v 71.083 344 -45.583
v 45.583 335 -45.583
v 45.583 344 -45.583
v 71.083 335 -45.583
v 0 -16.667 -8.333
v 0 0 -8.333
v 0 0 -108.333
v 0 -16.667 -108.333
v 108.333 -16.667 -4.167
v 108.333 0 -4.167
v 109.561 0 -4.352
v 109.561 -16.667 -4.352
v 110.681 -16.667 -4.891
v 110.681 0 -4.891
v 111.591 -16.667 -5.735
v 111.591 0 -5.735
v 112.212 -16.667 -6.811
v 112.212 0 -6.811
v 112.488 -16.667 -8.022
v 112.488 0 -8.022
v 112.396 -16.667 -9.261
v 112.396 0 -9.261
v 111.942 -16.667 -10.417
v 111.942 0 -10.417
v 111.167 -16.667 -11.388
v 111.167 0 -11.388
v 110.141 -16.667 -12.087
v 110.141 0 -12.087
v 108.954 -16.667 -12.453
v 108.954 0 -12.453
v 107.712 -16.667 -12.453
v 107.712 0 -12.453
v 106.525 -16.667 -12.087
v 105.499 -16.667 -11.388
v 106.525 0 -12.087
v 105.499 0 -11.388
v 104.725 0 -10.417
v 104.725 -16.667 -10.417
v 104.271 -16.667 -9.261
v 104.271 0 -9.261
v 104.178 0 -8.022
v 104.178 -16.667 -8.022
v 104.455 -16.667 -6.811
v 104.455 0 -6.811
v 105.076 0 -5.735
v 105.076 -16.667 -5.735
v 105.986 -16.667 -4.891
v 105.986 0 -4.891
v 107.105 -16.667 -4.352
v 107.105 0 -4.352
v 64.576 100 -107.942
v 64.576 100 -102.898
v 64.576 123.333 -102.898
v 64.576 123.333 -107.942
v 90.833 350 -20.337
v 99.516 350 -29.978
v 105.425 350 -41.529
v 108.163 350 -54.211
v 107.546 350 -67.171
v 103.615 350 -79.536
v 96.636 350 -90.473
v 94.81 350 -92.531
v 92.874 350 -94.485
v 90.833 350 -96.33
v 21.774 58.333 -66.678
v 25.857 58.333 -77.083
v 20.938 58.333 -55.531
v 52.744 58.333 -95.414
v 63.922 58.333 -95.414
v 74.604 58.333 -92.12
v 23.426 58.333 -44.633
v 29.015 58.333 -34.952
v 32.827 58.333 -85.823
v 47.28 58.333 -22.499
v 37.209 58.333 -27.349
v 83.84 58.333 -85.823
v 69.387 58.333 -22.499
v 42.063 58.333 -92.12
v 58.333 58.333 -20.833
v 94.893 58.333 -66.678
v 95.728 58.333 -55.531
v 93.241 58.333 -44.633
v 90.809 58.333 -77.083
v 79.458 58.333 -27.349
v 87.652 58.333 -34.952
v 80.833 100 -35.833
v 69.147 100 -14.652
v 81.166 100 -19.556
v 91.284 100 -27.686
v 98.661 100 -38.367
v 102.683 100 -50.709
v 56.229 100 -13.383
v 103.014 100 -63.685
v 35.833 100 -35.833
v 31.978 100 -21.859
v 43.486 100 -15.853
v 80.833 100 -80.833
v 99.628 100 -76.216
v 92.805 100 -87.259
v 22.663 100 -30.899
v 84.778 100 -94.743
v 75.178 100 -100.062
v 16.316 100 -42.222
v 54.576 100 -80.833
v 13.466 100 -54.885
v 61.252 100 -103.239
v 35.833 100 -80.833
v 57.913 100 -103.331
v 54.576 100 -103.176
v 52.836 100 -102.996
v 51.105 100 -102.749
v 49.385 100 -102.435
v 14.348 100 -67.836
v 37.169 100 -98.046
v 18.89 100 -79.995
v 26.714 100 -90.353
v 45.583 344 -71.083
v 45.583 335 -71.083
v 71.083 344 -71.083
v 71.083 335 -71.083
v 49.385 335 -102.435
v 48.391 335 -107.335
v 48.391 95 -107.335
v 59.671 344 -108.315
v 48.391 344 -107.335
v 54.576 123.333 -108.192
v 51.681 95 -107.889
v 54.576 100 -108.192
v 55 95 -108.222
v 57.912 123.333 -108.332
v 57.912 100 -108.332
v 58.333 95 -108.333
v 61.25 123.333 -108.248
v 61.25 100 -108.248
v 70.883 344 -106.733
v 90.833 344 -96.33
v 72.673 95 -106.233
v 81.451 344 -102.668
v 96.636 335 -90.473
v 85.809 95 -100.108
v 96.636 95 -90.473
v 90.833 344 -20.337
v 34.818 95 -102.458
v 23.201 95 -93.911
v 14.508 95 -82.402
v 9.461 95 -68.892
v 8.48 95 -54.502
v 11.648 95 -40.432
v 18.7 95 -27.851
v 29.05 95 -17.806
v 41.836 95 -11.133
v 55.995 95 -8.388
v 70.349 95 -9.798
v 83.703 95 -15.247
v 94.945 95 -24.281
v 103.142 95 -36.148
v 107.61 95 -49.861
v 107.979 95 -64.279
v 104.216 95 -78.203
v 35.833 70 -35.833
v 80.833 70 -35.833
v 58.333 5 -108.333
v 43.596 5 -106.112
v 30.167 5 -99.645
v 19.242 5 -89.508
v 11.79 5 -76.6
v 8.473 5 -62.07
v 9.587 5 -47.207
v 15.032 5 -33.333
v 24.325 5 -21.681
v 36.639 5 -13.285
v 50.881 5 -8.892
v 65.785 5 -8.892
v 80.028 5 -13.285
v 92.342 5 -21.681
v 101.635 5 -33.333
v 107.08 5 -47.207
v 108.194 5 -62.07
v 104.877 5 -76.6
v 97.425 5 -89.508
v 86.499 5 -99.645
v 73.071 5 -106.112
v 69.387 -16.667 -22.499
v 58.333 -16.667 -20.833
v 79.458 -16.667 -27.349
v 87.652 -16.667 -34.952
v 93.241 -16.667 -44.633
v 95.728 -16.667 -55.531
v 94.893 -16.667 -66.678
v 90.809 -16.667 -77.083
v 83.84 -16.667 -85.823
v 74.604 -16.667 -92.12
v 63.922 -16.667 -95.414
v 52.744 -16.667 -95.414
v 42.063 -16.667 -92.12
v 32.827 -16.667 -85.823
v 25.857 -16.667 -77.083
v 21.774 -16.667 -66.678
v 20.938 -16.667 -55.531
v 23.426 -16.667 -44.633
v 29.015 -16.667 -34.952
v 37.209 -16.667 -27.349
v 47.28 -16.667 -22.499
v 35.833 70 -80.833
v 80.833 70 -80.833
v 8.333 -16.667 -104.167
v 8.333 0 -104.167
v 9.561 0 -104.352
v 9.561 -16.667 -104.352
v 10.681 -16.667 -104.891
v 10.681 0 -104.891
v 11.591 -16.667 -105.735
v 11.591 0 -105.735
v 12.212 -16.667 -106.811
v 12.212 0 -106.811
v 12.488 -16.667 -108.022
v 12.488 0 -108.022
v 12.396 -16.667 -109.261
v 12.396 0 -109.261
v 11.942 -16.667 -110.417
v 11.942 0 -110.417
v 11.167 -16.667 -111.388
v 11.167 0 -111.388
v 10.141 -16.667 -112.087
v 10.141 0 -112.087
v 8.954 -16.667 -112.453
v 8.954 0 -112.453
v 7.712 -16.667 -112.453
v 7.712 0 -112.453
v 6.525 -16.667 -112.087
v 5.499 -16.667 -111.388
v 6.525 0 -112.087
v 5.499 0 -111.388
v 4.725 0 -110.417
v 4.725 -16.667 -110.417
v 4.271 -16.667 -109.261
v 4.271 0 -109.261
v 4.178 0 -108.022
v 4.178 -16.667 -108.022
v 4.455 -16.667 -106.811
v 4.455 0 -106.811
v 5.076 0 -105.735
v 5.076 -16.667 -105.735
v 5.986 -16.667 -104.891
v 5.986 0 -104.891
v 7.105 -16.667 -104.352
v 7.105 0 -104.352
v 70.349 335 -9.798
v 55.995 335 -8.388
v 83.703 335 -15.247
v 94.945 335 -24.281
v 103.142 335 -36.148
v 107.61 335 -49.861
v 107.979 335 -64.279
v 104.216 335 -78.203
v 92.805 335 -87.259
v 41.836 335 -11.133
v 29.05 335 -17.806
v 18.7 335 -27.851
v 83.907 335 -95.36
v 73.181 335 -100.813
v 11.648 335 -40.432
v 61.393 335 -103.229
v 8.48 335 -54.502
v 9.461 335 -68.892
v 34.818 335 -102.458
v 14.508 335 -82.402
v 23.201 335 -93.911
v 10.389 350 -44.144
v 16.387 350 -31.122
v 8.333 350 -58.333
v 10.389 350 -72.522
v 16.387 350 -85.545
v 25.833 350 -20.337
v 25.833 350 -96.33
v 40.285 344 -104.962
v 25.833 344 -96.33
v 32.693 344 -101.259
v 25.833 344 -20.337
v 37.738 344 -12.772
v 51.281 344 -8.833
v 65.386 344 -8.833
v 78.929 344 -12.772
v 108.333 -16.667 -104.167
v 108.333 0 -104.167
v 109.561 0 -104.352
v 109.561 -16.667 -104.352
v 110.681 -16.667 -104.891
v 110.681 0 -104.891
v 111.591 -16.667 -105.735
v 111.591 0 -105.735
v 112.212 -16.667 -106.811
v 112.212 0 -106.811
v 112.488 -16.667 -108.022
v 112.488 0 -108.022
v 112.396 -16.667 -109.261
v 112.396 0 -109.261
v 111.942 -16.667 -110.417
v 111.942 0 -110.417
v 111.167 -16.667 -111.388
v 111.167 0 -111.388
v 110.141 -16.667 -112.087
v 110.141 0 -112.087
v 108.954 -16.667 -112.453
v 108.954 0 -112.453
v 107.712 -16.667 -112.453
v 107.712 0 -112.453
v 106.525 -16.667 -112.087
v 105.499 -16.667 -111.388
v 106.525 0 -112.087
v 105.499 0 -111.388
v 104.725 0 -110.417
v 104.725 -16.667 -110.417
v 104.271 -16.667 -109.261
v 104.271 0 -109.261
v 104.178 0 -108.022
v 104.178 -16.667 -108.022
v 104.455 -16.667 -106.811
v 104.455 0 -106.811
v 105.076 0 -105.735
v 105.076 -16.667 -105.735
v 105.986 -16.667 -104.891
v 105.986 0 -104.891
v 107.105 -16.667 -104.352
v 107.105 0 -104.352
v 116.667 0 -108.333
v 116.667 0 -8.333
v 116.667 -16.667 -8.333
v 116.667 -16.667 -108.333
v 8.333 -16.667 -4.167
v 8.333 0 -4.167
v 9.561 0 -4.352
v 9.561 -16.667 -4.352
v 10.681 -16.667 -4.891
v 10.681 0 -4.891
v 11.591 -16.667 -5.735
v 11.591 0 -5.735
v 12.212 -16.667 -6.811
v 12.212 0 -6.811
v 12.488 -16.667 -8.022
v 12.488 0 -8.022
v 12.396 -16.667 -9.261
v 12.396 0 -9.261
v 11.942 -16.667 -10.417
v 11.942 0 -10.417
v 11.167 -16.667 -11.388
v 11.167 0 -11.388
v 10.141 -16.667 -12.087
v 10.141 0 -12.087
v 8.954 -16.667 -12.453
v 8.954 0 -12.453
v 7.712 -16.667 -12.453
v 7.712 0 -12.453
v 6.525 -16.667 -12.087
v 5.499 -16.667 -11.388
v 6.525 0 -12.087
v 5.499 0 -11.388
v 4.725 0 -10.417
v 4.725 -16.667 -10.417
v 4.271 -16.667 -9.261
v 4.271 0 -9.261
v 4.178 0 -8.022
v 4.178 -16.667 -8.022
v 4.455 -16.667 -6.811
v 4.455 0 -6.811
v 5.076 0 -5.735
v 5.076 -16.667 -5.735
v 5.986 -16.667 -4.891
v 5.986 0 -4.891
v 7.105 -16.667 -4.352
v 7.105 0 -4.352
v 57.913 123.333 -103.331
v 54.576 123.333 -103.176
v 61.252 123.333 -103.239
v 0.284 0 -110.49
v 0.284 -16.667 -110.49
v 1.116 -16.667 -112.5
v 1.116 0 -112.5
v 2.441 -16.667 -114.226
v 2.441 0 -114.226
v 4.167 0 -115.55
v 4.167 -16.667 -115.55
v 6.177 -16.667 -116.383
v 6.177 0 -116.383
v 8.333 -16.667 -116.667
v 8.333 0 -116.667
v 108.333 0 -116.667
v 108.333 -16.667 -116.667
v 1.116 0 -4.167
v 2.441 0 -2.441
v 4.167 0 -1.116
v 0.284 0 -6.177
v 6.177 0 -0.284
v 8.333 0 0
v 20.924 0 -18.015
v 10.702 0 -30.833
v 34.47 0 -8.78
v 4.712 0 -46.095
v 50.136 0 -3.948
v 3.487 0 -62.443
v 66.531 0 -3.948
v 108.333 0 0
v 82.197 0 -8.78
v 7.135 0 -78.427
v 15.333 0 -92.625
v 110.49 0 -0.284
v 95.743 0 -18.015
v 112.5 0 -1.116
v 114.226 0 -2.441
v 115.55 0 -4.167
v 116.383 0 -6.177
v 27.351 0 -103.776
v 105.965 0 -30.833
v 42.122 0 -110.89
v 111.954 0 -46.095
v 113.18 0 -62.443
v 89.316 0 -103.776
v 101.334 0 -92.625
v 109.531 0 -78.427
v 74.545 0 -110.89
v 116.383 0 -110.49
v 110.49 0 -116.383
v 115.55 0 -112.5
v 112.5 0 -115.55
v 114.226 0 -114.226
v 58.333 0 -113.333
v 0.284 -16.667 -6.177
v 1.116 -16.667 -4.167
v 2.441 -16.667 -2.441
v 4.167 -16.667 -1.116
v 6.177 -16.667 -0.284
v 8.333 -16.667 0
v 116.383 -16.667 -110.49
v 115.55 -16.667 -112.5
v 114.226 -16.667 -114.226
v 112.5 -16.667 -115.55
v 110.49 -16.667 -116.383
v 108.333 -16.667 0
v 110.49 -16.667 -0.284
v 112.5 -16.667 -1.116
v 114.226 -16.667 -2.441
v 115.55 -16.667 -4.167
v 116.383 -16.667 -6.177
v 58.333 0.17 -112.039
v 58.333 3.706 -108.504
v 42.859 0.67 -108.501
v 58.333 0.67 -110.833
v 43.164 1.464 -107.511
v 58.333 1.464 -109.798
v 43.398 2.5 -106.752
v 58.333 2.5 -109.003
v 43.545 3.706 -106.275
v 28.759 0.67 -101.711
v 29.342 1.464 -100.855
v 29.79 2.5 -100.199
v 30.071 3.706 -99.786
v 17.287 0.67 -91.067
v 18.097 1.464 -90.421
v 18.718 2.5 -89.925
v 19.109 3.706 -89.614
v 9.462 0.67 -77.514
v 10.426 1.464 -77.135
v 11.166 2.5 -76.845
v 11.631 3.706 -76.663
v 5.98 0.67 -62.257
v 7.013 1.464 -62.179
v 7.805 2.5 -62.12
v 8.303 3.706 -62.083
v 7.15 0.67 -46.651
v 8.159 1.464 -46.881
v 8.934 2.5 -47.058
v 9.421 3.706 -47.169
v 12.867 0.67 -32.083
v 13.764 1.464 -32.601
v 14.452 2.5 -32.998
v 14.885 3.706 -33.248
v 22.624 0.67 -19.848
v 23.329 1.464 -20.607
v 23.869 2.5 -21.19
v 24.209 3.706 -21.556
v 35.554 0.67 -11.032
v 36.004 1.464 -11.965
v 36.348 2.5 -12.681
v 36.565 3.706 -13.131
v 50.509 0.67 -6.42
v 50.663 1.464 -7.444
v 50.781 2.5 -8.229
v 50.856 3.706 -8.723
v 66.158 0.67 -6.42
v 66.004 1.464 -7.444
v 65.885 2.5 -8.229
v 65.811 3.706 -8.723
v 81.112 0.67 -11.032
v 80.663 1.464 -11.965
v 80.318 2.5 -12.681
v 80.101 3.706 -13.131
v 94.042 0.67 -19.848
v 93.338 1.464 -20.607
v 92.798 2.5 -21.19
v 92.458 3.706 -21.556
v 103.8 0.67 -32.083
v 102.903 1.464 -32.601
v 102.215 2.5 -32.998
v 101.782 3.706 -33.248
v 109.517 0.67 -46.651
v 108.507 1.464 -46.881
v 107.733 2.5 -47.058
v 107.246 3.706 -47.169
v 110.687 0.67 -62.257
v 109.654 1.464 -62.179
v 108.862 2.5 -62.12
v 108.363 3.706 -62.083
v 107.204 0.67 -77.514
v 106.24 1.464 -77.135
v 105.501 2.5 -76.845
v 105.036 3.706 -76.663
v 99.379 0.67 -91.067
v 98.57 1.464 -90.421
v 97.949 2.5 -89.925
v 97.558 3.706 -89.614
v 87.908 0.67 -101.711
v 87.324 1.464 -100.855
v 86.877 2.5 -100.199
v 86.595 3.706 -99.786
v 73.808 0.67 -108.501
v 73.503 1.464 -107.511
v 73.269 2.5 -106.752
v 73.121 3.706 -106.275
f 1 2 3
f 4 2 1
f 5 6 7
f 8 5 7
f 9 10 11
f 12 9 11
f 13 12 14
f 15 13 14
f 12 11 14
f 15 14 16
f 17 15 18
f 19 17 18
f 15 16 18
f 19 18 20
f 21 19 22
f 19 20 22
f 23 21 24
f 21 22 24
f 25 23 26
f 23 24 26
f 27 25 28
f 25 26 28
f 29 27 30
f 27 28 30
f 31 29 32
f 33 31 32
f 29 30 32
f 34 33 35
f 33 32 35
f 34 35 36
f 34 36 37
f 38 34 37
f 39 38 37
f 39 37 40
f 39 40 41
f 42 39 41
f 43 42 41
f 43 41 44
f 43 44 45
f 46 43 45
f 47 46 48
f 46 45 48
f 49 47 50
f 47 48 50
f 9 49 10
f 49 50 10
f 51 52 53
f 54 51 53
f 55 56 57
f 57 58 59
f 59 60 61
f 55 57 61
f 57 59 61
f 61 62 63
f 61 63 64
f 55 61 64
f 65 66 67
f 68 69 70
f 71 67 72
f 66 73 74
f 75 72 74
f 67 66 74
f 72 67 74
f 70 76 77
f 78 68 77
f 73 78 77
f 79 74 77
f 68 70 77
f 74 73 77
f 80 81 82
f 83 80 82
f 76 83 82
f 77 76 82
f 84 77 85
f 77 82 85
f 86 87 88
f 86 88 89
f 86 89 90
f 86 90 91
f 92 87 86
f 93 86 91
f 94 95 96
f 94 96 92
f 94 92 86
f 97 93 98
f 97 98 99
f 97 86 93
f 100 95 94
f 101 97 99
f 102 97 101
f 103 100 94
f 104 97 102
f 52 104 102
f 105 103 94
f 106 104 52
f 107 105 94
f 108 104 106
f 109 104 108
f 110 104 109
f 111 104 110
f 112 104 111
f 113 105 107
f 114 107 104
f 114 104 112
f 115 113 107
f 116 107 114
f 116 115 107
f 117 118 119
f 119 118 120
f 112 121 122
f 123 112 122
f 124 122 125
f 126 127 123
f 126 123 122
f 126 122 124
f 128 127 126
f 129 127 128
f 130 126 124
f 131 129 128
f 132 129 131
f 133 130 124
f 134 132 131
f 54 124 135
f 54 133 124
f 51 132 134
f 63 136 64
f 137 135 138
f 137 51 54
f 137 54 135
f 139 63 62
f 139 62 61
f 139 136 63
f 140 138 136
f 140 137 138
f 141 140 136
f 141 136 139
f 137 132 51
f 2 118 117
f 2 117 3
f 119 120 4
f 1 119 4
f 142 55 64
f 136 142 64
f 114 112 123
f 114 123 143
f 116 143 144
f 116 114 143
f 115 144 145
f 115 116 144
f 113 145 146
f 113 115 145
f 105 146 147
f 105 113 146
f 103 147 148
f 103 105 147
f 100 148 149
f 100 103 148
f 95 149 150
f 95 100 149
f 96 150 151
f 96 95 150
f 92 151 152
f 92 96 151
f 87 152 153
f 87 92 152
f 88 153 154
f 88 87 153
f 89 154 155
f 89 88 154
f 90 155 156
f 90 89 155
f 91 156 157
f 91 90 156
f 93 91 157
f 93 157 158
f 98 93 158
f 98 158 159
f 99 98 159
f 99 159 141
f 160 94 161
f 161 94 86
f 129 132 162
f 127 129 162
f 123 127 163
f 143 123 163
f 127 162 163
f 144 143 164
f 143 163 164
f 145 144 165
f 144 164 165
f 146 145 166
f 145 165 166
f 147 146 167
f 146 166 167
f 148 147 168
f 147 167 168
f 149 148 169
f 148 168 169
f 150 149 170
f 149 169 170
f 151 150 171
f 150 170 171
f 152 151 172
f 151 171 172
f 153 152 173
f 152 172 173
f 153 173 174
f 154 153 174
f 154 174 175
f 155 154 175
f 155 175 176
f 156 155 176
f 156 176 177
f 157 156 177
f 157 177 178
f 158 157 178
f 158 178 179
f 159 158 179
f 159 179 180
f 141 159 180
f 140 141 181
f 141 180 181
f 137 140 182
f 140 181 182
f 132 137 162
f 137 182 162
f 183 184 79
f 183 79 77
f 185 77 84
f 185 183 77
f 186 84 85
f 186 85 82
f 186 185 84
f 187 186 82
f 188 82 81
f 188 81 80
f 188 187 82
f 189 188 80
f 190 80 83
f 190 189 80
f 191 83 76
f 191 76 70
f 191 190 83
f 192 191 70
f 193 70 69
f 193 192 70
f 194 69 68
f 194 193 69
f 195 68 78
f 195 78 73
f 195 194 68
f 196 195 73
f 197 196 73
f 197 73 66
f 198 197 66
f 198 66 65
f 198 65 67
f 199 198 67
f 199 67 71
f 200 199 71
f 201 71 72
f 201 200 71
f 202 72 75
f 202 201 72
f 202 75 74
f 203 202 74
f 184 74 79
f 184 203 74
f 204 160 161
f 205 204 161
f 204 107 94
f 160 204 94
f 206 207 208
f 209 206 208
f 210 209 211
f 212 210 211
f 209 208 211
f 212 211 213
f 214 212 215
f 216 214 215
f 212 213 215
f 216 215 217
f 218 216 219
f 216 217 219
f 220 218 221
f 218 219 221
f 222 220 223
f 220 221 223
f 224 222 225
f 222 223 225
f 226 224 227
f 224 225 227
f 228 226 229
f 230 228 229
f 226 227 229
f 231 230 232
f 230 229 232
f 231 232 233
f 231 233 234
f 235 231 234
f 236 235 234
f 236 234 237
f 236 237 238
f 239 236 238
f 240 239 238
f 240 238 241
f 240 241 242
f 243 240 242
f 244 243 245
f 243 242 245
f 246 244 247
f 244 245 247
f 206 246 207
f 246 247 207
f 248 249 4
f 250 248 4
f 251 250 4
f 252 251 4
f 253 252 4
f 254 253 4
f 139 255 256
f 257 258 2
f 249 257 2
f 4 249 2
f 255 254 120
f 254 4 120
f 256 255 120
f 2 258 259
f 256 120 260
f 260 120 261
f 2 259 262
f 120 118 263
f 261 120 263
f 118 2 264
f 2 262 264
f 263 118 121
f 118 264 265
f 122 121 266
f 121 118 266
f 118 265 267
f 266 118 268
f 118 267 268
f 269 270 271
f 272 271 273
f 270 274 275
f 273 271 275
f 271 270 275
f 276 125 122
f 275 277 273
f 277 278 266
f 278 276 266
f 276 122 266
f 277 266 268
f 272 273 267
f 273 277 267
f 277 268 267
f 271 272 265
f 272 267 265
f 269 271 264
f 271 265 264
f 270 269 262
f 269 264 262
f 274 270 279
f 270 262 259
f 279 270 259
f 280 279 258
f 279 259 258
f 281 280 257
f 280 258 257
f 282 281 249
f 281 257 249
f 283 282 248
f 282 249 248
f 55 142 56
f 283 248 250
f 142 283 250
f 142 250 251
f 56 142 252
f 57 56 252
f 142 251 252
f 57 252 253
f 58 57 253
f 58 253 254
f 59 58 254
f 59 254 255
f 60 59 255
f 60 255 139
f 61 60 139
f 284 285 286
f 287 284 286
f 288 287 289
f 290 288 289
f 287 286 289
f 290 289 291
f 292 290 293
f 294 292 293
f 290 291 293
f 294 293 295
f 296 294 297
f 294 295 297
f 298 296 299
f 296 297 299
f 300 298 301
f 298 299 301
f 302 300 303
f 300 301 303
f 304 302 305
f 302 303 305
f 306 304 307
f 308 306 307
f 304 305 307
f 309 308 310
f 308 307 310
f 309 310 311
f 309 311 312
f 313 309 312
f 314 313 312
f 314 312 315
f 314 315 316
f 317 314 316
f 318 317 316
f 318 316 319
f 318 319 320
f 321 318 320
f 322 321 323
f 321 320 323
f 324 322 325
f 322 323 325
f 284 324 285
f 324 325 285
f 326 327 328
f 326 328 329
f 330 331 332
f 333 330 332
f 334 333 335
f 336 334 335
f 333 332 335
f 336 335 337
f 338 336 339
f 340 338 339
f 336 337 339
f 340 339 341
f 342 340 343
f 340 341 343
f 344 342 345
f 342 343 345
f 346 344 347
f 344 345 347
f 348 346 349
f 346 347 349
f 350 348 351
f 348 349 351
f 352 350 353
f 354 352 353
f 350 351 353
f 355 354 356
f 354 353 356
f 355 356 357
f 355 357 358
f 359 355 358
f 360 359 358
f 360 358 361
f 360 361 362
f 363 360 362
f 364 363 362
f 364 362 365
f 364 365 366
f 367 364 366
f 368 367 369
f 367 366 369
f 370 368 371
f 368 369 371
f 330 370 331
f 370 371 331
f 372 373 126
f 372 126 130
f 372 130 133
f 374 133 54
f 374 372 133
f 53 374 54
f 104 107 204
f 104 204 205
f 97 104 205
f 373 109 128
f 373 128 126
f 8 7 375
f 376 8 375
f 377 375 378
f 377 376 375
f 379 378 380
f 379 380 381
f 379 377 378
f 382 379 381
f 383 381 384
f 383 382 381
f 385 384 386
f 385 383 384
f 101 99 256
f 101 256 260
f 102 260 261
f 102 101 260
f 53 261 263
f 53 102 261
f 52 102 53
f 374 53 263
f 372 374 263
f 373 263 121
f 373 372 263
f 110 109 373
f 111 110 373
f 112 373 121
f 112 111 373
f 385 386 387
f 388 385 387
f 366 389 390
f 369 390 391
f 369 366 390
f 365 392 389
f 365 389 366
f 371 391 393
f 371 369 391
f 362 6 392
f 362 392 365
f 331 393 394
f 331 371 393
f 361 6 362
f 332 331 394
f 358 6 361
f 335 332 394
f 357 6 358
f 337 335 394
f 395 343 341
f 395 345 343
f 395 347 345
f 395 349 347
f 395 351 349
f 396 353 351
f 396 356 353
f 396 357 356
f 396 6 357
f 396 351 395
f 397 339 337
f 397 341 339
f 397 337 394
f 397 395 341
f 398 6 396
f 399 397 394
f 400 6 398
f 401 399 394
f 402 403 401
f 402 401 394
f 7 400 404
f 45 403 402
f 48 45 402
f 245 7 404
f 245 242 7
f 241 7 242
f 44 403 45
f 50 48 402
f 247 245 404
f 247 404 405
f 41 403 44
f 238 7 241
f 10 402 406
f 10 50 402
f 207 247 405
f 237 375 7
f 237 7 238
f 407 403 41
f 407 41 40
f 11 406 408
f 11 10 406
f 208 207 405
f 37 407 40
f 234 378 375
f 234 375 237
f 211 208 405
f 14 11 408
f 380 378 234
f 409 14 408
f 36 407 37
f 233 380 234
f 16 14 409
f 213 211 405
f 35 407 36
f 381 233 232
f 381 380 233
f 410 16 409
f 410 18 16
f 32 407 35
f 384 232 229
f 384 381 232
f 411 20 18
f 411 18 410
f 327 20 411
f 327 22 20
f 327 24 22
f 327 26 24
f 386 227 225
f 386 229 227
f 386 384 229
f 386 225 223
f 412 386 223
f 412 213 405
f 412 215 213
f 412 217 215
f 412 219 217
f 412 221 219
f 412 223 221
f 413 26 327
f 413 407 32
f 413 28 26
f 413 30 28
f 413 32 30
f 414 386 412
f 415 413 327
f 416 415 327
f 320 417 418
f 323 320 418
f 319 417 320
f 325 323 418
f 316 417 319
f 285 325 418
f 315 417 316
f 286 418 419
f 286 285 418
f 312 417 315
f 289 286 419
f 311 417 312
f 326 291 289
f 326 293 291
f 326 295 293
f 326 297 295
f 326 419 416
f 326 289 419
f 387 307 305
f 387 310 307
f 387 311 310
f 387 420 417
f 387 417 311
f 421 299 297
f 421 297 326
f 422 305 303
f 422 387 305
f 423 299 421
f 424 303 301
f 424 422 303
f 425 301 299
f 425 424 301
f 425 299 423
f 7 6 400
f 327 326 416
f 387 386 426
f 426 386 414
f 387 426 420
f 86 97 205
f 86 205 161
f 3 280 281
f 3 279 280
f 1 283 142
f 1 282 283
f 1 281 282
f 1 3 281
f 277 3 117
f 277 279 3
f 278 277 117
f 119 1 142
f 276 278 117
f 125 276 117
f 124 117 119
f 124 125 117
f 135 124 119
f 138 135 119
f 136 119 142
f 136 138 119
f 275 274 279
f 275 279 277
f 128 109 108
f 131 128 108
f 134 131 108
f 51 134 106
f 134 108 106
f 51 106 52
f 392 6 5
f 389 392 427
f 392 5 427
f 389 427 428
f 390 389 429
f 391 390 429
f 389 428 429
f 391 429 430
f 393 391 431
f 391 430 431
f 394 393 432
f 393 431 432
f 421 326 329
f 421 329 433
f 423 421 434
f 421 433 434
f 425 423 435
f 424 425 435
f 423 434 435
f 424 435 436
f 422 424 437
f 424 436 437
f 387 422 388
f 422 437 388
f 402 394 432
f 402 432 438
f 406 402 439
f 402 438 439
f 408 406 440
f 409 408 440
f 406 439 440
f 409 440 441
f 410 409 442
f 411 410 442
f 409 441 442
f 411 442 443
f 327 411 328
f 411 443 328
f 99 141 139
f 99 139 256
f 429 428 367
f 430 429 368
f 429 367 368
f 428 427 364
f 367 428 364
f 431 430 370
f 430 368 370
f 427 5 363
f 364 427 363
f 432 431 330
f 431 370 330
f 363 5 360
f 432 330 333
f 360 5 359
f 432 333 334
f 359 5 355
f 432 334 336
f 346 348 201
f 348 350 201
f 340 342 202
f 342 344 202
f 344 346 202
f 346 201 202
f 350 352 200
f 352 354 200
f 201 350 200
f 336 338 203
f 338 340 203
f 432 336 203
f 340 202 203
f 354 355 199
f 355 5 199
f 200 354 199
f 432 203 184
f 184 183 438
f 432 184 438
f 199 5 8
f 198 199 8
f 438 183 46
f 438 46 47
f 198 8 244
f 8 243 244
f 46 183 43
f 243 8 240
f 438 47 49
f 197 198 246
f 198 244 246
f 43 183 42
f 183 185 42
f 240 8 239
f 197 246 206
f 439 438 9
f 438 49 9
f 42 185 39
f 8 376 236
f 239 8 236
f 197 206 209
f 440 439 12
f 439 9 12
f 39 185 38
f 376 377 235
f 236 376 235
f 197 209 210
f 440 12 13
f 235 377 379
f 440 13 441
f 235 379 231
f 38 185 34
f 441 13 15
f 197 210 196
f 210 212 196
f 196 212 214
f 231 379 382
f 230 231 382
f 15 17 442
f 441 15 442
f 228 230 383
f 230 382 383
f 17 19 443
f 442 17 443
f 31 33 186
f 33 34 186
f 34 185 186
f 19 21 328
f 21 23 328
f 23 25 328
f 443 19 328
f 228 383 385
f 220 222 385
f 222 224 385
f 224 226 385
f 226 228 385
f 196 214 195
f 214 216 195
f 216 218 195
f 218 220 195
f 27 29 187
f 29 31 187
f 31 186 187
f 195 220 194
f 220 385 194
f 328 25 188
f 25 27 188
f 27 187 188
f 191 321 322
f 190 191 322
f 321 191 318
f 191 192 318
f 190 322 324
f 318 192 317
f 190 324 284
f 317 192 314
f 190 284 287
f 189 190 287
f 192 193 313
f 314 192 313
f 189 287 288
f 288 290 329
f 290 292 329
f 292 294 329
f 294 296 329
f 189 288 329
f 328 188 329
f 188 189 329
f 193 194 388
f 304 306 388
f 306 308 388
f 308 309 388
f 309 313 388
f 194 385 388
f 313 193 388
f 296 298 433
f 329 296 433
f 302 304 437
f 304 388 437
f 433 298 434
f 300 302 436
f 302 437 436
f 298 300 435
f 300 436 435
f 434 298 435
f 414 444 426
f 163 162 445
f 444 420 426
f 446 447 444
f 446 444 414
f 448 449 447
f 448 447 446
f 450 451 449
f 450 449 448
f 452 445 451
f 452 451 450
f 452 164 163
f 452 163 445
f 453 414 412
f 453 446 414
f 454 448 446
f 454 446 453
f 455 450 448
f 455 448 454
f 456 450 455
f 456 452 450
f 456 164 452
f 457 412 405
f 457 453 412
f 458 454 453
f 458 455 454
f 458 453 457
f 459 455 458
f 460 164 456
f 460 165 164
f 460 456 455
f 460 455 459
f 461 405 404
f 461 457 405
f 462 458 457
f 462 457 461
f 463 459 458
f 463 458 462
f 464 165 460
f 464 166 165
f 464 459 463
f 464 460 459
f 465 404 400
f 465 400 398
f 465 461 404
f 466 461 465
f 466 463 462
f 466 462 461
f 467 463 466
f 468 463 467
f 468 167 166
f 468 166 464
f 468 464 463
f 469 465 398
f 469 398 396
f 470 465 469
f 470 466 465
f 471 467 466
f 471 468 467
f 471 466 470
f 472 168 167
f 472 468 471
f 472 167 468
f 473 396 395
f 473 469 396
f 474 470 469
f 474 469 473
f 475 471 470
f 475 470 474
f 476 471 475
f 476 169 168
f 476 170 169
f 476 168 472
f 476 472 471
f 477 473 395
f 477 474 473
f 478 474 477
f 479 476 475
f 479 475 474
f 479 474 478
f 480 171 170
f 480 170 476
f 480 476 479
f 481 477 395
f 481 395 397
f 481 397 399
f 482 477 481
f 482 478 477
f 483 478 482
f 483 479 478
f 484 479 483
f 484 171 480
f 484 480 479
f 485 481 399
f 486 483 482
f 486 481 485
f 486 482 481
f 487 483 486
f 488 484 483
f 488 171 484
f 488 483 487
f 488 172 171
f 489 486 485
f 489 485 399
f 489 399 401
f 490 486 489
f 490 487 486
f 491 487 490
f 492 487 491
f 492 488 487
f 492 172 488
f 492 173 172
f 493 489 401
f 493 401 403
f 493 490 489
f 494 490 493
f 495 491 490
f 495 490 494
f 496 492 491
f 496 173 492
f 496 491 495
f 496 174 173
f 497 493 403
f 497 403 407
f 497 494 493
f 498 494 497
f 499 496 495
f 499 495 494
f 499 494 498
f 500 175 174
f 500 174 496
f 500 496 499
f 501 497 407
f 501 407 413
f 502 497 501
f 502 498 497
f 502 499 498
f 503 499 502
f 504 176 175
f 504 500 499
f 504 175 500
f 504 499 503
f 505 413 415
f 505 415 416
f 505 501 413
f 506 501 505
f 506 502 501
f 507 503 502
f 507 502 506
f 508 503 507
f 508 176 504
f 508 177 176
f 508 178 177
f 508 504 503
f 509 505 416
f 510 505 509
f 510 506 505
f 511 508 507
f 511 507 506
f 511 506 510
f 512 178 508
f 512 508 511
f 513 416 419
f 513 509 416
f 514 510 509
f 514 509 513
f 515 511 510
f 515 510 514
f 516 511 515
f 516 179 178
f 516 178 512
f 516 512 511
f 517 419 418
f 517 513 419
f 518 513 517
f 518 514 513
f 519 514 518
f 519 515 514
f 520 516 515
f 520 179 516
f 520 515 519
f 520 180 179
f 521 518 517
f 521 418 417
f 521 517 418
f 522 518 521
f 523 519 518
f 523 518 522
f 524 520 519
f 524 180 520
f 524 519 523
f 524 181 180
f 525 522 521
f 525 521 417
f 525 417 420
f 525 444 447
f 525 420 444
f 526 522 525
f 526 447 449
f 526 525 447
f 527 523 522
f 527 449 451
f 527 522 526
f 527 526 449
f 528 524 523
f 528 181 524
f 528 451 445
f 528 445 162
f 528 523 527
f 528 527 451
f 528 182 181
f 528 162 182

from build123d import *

# Parameters (mm, degrees)
SKETCH1_W                = 350
SKETCH1_H                = 350
BOSS_EXTRUDE1_DEPTH      = 50
FILLET1_R                = 25
SKETCH2_R                = 12.5
CUT_EXTRUDE1_DEPTH       = 50
SKETCH3_R                = 150
BOSS_EXTRUDE2_DEPTH      = 300
FILLET2_R                = 15
CHAMFER1_SIZE            = 15
SKETCH5_W                = 135
SKETCH5_H                = 135
CUT_EXTRUDE3_DEPTH       = 90
SCALE1_SCALE             = 0.333333333
EXTRUDE_THIN1_DEPTH      = 250
EXTRUDE_THIN1_DEPTH_BACK = 5
BOSS_EXTRUDE3_START      = -15
SKETCH7_R                = 50
BOSS_EXTRUDE3_DEPTH      = 15
SKETCH8_W                = 25.5
SKETCH8_H                = 25.5
CUT_EXTRUDE4_DEPTH       = 9.5
SKETCH9_W                = 65
SKETCH9_H                = 100
CUT_EXTRUDE5_DEPTH       = 6
SKETCH10_W               = 10
SKETCH10_H               = 23.333333333
CUT_EXTRUDE6_DEPTH       = 378.683913993
SKETCH12_R               = 37.5
CUT_EXTRUDE7_DEPTH       = 75


with BuildPart() as part:
    # Sketch1 → Boss-Extrude1 (new body)
    with BuildSketch(Plane(origin=(0, 0, 0), x_dir=(1, 0, 0), z_dir=(0, 1, 0))):
        with Locations((175, 175)):
            Rectangle(SKETCH1_W, SKETCH1_H)
    extrude(amount=-BOSS_EXTRUDE1_DEPTH)

    # Fillet1
    fillet1_edges = [part.edges().sort_by_distance(p)[0] for p in [
        (0, -25, -350),
        (350, -25, -350),
        (350, -25, 0),
        (0, -25, 0),
    ]]
    fillet(fillet1_edges, radius=FILLET1_R)

    # Sketch2 → Cut-Extrude1 (cut)
    with BuildSketch(Plane(origin=(0, 0, 0), x_dir=(1, 0, 0), z_dir=(0, 1, 0))):
        with Locations(Location((25, 25, 0), (0, 0, 270))):
            Circle(SKETCH2_R)
        with Locations(Location((325, 25, 0), (0, 0, 270))):
            Circle(SKETCH2_R)
        with Locations(Location((325, 325, 0), (0, 0, 270))):
            Circle(SKETCH2_R)
        with Locations(Location((25, 325, 0), (0, 0, 270))):
            Circle(SKETCH2_R)
    extrude(amount=-CUT_EXTRUDE1_DEPTH, mode=Mode.SUBTRACT)

    # Sketch3 → Boss-Extrude2 (add)
    with BuildSketch(Plane(origin=(0, 0, 0), x_dir=(1, 0, 0), z_dir=(0, 1, 0))):
        with Locations(Location((175, 175, 0), (0, 0, 90))):
            Circle(SKETCH3_R)
    extrude(amount=BOSS_EXTRUDE2_DEPTH)

    # Fillet2
    fillet2_edges = [part.edges().sort_by_distance(p)[0] for p in [
        (175, 0, -25),
    ]]
    fillet(fillet2_edges, radius=FILLET2_R)

    # Chamfer1
    chamfer1_edges = [part.edges().sort_by_distance(p)[0] for p in [
        (175, 300, -25),
    ]]
    chamfer(chamfer1_edges, length=CHAMFER1_SIZE)

    # Sketch5 → Cut-Extrude3 (cut)
    with BuildSketch(Plane.XZ.offset(-300)):
        with Locations((175, -175)):
            Rectangle(SKETCH5_W, SKETCH5_H)
    extrude(amount=CUT_EXTRUDE3_DEPTH, mode=Mode.SUBTRACT)


with BuildPart() as part_1:
    # Scale1: scaled about (0, 0, 0)
    add(part.part.scale(SCALE1_SCALE))

    # Sketch6 → Extrude-Thin1 (add, two sides: drawn at the far end of the back side and taken through both)
    with BuildSketch(Plane(origin=(0, 100, 0), x_dir=(1, 0, 0), z_dir=(0, 1, 0)).offset(-EXTRUDE_THIN1_DEPTH_BACK)):
        with BuildLine():
            ThreePointArc((48.391261826, 107.334917126), (74.830545561, 105.5333544), (96.635555489, 90.472713818))
            Line((96.635555489, 90.472713818), (92.805333274, 87.258775769))
            ThreePointArc((92.805333274, 87.258775769), (73.180824339, 100.813352293), (49.385468977, 102.434758746))
            Line((49.385468977, 102.434758746), (48.391261826, 107.334917126))
        make_face()
    extrude(amount=EXTRUDE_THIN1_DEPTH + EXTRUDE_THIN1_DEPTH_BACK)

    # Sketch7 → Boss-Extrude3 (add)
    with BuildSketch(Plane(origin=(0, 350, 0), x_dir=(1, 0, 0), z_dir=(0, 1, 0)).offset(BOSS_EXTRUDE3_START)):
        with Locations(Location((58.333333333, 58.333333333, 0), (0, 0, 90))):
            Circle(SKETCH7_R)
    extrude(amount=BOSS_EXTRUDE3_DEPTH)

    # Sketch8 → Cut-Extrude4 (cut)
    with BuildSketch(Plane.XZ.offset(-335)):
        with Locations((58.333333333, -58.333333333)):
            Rectangle(SKETCH8_W, SKETCH8_H)
    extrude(amount=-CUT_EXTRUDE4_DEPTH, mode=Mode.SUBTRACT)

    # Sketch9 → Cut-Extrude5 (cut)
    with BuildSketch(Plane(origin=(0, 350, 0), x_dir=(1, 0, 0), z_dir=(0, 1, 0))):
        with Locations((58.333333333, 58.333333333)):
            Rectangle(SKETCH9_W, SKETCH9_H)
    extrude(amount=-CUT_EXTRUDE5_DEPTH, mode=Mode.SUBTRACT)

    # Sketch10 → Cut-Extrude6 (cut, through all)
    with BuildSketch(Plane.XY.offset(-80.833333333)):
        with Locations((59.575622215, 111.666666667)):
            Rectangle(SKETCH10_W, SKETCH10_H)
    extrude(amount=-CUT_EXTRUDE6_DEPTH, mode=Mode.SUBTRACT)

    # Sketch12 → Cut-Extrude7 (cut)
    with BuildSketch(Plane(origin=(0, -16.666666667, 0), x_dir=(1, 0, 0), z_dir=(0, 1, 0))):
        with Locations(Location((58.333333333, 58.333333333, 0), (0, 0, 270))):
            Circle(SKETCH12_R)
    extrude(amount=CUT_EXTRUDE7_DEPTH, mode=Mode.SUBTRACT)


solid = part_1.part
